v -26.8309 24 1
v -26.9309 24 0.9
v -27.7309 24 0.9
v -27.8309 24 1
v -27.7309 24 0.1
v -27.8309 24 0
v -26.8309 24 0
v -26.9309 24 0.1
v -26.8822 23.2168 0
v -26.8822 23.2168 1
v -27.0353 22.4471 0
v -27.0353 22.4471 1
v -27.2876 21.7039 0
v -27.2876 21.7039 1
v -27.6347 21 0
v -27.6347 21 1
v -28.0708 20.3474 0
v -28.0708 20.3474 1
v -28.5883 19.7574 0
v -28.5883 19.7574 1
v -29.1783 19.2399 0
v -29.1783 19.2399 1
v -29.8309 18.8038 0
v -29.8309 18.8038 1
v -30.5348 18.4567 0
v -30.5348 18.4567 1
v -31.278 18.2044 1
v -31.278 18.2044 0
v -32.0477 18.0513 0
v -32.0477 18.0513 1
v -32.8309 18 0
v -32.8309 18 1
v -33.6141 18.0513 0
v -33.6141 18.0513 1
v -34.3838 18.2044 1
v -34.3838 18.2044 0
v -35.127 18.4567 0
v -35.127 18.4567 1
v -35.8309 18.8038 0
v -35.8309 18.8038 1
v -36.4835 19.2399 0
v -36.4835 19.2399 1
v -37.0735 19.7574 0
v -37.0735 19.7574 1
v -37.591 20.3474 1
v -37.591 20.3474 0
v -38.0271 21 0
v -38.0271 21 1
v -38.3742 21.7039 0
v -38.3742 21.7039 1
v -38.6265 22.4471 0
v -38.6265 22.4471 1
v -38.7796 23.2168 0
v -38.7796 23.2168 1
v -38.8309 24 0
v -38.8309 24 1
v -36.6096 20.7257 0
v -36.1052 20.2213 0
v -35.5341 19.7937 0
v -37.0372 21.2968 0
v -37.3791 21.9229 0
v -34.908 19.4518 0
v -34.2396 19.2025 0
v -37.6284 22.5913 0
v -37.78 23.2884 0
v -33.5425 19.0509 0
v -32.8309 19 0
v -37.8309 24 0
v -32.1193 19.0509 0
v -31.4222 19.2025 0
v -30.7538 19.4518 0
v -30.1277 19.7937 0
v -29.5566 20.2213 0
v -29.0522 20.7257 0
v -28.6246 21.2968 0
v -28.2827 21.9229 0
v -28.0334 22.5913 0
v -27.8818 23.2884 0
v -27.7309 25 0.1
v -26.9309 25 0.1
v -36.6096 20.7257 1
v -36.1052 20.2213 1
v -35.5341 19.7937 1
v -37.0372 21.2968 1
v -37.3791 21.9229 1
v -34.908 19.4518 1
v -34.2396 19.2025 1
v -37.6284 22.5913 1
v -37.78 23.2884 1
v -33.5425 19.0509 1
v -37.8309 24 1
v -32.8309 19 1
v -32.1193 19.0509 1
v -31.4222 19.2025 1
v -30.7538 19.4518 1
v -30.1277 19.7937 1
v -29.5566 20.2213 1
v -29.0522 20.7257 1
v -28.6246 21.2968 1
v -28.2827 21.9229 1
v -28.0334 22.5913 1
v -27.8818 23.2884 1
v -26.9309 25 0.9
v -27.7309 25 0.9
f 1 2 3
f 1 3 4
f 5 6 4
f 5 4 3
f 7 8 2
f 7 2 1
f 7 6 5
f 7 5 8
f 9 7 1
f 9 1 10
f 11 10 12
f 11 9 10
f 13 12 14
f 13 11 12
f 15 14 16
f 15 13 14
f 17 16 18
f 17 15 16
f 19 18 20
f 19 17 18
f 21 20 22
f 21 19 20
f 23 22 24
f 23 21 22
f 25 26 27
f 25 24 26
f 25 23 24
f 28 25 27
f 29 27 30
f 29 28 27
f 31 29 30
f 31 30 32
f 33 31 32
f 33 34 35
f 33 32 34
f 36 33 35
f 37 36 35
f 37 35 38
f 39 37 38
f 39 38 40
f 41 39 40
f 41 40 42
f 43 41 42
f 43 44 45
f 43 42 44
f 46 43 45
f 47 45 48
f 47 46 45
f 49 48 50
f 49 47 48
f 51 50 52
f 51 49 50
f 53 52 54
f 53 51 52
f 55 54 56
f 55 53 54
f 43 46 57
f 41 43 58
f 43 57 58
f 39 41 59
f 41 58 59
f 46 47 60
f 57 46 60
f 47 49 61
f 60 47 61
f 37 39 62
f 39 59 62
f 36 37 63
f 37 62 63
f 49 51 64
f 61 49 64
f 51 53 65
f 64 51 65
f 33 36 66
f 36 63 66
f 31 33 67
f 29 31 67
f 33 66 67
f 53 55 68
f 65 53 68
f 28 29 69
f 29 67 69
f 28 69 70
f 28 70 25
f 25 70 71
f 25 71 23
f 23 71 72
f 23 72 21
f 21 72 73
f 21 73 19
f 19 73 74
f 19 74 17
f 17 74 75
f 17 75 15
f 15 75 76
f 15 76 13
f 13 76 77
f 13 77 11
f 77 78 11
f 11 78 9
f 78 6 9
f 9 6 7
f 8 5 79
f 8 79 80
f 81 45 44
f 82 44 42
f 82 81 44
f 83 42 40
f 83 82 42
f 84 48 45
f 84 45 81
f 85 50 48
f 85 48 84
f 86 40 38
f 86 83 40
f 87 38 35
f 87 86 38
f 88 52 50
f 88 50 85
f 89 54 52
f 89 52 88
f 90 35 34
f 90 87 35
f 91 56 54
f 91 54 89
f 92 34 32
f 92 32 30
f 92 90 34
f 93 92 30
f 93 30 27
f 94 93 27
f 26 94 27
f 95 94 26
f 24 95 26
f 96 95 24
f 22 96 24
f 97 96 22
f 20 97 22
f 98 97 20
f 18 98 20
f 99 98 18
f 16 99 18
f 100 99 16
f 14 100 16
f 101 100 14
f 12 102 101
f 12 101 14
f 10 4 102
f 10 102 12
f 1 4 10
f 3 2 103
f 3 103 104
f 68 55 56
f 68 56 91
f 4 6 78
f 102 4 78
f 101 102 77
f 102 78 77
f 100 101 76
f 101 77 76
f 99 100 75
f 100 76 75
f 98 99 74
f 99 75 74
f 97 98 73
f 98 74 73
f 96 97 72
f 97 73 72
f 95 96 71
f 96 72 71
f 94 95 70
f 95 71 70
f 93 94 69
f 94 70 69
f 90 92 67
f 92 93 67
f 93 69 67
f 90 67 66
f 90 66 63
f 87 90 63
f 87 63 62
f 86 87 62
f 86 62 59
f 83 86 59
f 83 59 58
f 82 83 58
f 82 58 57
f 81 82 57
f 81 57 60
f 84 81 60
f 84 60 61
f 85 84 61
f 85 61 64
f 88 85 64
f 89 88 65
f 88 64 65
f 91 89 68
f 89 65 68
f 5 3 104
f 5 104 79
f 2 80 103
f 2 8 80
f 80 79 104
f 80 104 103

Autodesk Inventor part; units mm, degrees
ref_plane "YZ Plane" through (0, 0, 0) normal (1, 0, 0) x (0, 1, 0)
ref_plane "XZ Plane" through (0, 0, 0) normal (0, 1, 0) x (-1, 0, 0)
sketch "Sketch1" plane through (0, 0, 0) normal (0, 0, 1) x (1, 0, 0)
  arc A0 (-38.8309, 24) -> (-26.8309, 24) centre (-32.8309, 24) ccw
  arc A1 (-37.8309, 24) -> (-27.8309, 24) centre (-32.8309, 24) ccw
  line L0 (-38.8309, 24) -> (-26.8309, 24)
  point P0 (0, 0)
  dimension "d0" = 1
  dimension "d1" = 5
ref_plane "Work Plane1" through (-32.8309, 24, 0) normal (0, 1, 0) x (-1, 0, 0)
sketch "Sketch2" plane through (-32.8309, 24, 0) normal (0, 1, 0) x (-1, 0, 0)
  point P0 (-32.8309, 0)
extrude "Extrusion1" add sketch "Sketch1" along normal blind 1 contours L0 A1 A0
sketch "Sketch3" plane through (-27.8309, 24, 0) normal (0, 1, 0) x (1, 0, 0)
  line L0 (1, 0) -> (0, 0) projected
  line L1 (0, 0) -> (0, -1) projected
  line L2 (1, -1) -> (0, -1) projected
  line L3 (1, 0) -> (1, -1) projected
  line L4 (0.1, -0.1) -> (0.9, -0.1)
  line L5 (0.9, -0.1) -> (0.9, -0.9)
  line L6 (0.9, -0.9) -> (0.1, -0.9)
  line L7 (0.1, -0.9) -> (0.1, -0.1)
  point P0 (27.8309, 0)
  dimension "d4" = 0.8
extrude "Extrusion2" add sketch "Sketch3" along normal blind 1 contours L4 L5 L6 L7
properties part number "McCrea_kabel_walle"
